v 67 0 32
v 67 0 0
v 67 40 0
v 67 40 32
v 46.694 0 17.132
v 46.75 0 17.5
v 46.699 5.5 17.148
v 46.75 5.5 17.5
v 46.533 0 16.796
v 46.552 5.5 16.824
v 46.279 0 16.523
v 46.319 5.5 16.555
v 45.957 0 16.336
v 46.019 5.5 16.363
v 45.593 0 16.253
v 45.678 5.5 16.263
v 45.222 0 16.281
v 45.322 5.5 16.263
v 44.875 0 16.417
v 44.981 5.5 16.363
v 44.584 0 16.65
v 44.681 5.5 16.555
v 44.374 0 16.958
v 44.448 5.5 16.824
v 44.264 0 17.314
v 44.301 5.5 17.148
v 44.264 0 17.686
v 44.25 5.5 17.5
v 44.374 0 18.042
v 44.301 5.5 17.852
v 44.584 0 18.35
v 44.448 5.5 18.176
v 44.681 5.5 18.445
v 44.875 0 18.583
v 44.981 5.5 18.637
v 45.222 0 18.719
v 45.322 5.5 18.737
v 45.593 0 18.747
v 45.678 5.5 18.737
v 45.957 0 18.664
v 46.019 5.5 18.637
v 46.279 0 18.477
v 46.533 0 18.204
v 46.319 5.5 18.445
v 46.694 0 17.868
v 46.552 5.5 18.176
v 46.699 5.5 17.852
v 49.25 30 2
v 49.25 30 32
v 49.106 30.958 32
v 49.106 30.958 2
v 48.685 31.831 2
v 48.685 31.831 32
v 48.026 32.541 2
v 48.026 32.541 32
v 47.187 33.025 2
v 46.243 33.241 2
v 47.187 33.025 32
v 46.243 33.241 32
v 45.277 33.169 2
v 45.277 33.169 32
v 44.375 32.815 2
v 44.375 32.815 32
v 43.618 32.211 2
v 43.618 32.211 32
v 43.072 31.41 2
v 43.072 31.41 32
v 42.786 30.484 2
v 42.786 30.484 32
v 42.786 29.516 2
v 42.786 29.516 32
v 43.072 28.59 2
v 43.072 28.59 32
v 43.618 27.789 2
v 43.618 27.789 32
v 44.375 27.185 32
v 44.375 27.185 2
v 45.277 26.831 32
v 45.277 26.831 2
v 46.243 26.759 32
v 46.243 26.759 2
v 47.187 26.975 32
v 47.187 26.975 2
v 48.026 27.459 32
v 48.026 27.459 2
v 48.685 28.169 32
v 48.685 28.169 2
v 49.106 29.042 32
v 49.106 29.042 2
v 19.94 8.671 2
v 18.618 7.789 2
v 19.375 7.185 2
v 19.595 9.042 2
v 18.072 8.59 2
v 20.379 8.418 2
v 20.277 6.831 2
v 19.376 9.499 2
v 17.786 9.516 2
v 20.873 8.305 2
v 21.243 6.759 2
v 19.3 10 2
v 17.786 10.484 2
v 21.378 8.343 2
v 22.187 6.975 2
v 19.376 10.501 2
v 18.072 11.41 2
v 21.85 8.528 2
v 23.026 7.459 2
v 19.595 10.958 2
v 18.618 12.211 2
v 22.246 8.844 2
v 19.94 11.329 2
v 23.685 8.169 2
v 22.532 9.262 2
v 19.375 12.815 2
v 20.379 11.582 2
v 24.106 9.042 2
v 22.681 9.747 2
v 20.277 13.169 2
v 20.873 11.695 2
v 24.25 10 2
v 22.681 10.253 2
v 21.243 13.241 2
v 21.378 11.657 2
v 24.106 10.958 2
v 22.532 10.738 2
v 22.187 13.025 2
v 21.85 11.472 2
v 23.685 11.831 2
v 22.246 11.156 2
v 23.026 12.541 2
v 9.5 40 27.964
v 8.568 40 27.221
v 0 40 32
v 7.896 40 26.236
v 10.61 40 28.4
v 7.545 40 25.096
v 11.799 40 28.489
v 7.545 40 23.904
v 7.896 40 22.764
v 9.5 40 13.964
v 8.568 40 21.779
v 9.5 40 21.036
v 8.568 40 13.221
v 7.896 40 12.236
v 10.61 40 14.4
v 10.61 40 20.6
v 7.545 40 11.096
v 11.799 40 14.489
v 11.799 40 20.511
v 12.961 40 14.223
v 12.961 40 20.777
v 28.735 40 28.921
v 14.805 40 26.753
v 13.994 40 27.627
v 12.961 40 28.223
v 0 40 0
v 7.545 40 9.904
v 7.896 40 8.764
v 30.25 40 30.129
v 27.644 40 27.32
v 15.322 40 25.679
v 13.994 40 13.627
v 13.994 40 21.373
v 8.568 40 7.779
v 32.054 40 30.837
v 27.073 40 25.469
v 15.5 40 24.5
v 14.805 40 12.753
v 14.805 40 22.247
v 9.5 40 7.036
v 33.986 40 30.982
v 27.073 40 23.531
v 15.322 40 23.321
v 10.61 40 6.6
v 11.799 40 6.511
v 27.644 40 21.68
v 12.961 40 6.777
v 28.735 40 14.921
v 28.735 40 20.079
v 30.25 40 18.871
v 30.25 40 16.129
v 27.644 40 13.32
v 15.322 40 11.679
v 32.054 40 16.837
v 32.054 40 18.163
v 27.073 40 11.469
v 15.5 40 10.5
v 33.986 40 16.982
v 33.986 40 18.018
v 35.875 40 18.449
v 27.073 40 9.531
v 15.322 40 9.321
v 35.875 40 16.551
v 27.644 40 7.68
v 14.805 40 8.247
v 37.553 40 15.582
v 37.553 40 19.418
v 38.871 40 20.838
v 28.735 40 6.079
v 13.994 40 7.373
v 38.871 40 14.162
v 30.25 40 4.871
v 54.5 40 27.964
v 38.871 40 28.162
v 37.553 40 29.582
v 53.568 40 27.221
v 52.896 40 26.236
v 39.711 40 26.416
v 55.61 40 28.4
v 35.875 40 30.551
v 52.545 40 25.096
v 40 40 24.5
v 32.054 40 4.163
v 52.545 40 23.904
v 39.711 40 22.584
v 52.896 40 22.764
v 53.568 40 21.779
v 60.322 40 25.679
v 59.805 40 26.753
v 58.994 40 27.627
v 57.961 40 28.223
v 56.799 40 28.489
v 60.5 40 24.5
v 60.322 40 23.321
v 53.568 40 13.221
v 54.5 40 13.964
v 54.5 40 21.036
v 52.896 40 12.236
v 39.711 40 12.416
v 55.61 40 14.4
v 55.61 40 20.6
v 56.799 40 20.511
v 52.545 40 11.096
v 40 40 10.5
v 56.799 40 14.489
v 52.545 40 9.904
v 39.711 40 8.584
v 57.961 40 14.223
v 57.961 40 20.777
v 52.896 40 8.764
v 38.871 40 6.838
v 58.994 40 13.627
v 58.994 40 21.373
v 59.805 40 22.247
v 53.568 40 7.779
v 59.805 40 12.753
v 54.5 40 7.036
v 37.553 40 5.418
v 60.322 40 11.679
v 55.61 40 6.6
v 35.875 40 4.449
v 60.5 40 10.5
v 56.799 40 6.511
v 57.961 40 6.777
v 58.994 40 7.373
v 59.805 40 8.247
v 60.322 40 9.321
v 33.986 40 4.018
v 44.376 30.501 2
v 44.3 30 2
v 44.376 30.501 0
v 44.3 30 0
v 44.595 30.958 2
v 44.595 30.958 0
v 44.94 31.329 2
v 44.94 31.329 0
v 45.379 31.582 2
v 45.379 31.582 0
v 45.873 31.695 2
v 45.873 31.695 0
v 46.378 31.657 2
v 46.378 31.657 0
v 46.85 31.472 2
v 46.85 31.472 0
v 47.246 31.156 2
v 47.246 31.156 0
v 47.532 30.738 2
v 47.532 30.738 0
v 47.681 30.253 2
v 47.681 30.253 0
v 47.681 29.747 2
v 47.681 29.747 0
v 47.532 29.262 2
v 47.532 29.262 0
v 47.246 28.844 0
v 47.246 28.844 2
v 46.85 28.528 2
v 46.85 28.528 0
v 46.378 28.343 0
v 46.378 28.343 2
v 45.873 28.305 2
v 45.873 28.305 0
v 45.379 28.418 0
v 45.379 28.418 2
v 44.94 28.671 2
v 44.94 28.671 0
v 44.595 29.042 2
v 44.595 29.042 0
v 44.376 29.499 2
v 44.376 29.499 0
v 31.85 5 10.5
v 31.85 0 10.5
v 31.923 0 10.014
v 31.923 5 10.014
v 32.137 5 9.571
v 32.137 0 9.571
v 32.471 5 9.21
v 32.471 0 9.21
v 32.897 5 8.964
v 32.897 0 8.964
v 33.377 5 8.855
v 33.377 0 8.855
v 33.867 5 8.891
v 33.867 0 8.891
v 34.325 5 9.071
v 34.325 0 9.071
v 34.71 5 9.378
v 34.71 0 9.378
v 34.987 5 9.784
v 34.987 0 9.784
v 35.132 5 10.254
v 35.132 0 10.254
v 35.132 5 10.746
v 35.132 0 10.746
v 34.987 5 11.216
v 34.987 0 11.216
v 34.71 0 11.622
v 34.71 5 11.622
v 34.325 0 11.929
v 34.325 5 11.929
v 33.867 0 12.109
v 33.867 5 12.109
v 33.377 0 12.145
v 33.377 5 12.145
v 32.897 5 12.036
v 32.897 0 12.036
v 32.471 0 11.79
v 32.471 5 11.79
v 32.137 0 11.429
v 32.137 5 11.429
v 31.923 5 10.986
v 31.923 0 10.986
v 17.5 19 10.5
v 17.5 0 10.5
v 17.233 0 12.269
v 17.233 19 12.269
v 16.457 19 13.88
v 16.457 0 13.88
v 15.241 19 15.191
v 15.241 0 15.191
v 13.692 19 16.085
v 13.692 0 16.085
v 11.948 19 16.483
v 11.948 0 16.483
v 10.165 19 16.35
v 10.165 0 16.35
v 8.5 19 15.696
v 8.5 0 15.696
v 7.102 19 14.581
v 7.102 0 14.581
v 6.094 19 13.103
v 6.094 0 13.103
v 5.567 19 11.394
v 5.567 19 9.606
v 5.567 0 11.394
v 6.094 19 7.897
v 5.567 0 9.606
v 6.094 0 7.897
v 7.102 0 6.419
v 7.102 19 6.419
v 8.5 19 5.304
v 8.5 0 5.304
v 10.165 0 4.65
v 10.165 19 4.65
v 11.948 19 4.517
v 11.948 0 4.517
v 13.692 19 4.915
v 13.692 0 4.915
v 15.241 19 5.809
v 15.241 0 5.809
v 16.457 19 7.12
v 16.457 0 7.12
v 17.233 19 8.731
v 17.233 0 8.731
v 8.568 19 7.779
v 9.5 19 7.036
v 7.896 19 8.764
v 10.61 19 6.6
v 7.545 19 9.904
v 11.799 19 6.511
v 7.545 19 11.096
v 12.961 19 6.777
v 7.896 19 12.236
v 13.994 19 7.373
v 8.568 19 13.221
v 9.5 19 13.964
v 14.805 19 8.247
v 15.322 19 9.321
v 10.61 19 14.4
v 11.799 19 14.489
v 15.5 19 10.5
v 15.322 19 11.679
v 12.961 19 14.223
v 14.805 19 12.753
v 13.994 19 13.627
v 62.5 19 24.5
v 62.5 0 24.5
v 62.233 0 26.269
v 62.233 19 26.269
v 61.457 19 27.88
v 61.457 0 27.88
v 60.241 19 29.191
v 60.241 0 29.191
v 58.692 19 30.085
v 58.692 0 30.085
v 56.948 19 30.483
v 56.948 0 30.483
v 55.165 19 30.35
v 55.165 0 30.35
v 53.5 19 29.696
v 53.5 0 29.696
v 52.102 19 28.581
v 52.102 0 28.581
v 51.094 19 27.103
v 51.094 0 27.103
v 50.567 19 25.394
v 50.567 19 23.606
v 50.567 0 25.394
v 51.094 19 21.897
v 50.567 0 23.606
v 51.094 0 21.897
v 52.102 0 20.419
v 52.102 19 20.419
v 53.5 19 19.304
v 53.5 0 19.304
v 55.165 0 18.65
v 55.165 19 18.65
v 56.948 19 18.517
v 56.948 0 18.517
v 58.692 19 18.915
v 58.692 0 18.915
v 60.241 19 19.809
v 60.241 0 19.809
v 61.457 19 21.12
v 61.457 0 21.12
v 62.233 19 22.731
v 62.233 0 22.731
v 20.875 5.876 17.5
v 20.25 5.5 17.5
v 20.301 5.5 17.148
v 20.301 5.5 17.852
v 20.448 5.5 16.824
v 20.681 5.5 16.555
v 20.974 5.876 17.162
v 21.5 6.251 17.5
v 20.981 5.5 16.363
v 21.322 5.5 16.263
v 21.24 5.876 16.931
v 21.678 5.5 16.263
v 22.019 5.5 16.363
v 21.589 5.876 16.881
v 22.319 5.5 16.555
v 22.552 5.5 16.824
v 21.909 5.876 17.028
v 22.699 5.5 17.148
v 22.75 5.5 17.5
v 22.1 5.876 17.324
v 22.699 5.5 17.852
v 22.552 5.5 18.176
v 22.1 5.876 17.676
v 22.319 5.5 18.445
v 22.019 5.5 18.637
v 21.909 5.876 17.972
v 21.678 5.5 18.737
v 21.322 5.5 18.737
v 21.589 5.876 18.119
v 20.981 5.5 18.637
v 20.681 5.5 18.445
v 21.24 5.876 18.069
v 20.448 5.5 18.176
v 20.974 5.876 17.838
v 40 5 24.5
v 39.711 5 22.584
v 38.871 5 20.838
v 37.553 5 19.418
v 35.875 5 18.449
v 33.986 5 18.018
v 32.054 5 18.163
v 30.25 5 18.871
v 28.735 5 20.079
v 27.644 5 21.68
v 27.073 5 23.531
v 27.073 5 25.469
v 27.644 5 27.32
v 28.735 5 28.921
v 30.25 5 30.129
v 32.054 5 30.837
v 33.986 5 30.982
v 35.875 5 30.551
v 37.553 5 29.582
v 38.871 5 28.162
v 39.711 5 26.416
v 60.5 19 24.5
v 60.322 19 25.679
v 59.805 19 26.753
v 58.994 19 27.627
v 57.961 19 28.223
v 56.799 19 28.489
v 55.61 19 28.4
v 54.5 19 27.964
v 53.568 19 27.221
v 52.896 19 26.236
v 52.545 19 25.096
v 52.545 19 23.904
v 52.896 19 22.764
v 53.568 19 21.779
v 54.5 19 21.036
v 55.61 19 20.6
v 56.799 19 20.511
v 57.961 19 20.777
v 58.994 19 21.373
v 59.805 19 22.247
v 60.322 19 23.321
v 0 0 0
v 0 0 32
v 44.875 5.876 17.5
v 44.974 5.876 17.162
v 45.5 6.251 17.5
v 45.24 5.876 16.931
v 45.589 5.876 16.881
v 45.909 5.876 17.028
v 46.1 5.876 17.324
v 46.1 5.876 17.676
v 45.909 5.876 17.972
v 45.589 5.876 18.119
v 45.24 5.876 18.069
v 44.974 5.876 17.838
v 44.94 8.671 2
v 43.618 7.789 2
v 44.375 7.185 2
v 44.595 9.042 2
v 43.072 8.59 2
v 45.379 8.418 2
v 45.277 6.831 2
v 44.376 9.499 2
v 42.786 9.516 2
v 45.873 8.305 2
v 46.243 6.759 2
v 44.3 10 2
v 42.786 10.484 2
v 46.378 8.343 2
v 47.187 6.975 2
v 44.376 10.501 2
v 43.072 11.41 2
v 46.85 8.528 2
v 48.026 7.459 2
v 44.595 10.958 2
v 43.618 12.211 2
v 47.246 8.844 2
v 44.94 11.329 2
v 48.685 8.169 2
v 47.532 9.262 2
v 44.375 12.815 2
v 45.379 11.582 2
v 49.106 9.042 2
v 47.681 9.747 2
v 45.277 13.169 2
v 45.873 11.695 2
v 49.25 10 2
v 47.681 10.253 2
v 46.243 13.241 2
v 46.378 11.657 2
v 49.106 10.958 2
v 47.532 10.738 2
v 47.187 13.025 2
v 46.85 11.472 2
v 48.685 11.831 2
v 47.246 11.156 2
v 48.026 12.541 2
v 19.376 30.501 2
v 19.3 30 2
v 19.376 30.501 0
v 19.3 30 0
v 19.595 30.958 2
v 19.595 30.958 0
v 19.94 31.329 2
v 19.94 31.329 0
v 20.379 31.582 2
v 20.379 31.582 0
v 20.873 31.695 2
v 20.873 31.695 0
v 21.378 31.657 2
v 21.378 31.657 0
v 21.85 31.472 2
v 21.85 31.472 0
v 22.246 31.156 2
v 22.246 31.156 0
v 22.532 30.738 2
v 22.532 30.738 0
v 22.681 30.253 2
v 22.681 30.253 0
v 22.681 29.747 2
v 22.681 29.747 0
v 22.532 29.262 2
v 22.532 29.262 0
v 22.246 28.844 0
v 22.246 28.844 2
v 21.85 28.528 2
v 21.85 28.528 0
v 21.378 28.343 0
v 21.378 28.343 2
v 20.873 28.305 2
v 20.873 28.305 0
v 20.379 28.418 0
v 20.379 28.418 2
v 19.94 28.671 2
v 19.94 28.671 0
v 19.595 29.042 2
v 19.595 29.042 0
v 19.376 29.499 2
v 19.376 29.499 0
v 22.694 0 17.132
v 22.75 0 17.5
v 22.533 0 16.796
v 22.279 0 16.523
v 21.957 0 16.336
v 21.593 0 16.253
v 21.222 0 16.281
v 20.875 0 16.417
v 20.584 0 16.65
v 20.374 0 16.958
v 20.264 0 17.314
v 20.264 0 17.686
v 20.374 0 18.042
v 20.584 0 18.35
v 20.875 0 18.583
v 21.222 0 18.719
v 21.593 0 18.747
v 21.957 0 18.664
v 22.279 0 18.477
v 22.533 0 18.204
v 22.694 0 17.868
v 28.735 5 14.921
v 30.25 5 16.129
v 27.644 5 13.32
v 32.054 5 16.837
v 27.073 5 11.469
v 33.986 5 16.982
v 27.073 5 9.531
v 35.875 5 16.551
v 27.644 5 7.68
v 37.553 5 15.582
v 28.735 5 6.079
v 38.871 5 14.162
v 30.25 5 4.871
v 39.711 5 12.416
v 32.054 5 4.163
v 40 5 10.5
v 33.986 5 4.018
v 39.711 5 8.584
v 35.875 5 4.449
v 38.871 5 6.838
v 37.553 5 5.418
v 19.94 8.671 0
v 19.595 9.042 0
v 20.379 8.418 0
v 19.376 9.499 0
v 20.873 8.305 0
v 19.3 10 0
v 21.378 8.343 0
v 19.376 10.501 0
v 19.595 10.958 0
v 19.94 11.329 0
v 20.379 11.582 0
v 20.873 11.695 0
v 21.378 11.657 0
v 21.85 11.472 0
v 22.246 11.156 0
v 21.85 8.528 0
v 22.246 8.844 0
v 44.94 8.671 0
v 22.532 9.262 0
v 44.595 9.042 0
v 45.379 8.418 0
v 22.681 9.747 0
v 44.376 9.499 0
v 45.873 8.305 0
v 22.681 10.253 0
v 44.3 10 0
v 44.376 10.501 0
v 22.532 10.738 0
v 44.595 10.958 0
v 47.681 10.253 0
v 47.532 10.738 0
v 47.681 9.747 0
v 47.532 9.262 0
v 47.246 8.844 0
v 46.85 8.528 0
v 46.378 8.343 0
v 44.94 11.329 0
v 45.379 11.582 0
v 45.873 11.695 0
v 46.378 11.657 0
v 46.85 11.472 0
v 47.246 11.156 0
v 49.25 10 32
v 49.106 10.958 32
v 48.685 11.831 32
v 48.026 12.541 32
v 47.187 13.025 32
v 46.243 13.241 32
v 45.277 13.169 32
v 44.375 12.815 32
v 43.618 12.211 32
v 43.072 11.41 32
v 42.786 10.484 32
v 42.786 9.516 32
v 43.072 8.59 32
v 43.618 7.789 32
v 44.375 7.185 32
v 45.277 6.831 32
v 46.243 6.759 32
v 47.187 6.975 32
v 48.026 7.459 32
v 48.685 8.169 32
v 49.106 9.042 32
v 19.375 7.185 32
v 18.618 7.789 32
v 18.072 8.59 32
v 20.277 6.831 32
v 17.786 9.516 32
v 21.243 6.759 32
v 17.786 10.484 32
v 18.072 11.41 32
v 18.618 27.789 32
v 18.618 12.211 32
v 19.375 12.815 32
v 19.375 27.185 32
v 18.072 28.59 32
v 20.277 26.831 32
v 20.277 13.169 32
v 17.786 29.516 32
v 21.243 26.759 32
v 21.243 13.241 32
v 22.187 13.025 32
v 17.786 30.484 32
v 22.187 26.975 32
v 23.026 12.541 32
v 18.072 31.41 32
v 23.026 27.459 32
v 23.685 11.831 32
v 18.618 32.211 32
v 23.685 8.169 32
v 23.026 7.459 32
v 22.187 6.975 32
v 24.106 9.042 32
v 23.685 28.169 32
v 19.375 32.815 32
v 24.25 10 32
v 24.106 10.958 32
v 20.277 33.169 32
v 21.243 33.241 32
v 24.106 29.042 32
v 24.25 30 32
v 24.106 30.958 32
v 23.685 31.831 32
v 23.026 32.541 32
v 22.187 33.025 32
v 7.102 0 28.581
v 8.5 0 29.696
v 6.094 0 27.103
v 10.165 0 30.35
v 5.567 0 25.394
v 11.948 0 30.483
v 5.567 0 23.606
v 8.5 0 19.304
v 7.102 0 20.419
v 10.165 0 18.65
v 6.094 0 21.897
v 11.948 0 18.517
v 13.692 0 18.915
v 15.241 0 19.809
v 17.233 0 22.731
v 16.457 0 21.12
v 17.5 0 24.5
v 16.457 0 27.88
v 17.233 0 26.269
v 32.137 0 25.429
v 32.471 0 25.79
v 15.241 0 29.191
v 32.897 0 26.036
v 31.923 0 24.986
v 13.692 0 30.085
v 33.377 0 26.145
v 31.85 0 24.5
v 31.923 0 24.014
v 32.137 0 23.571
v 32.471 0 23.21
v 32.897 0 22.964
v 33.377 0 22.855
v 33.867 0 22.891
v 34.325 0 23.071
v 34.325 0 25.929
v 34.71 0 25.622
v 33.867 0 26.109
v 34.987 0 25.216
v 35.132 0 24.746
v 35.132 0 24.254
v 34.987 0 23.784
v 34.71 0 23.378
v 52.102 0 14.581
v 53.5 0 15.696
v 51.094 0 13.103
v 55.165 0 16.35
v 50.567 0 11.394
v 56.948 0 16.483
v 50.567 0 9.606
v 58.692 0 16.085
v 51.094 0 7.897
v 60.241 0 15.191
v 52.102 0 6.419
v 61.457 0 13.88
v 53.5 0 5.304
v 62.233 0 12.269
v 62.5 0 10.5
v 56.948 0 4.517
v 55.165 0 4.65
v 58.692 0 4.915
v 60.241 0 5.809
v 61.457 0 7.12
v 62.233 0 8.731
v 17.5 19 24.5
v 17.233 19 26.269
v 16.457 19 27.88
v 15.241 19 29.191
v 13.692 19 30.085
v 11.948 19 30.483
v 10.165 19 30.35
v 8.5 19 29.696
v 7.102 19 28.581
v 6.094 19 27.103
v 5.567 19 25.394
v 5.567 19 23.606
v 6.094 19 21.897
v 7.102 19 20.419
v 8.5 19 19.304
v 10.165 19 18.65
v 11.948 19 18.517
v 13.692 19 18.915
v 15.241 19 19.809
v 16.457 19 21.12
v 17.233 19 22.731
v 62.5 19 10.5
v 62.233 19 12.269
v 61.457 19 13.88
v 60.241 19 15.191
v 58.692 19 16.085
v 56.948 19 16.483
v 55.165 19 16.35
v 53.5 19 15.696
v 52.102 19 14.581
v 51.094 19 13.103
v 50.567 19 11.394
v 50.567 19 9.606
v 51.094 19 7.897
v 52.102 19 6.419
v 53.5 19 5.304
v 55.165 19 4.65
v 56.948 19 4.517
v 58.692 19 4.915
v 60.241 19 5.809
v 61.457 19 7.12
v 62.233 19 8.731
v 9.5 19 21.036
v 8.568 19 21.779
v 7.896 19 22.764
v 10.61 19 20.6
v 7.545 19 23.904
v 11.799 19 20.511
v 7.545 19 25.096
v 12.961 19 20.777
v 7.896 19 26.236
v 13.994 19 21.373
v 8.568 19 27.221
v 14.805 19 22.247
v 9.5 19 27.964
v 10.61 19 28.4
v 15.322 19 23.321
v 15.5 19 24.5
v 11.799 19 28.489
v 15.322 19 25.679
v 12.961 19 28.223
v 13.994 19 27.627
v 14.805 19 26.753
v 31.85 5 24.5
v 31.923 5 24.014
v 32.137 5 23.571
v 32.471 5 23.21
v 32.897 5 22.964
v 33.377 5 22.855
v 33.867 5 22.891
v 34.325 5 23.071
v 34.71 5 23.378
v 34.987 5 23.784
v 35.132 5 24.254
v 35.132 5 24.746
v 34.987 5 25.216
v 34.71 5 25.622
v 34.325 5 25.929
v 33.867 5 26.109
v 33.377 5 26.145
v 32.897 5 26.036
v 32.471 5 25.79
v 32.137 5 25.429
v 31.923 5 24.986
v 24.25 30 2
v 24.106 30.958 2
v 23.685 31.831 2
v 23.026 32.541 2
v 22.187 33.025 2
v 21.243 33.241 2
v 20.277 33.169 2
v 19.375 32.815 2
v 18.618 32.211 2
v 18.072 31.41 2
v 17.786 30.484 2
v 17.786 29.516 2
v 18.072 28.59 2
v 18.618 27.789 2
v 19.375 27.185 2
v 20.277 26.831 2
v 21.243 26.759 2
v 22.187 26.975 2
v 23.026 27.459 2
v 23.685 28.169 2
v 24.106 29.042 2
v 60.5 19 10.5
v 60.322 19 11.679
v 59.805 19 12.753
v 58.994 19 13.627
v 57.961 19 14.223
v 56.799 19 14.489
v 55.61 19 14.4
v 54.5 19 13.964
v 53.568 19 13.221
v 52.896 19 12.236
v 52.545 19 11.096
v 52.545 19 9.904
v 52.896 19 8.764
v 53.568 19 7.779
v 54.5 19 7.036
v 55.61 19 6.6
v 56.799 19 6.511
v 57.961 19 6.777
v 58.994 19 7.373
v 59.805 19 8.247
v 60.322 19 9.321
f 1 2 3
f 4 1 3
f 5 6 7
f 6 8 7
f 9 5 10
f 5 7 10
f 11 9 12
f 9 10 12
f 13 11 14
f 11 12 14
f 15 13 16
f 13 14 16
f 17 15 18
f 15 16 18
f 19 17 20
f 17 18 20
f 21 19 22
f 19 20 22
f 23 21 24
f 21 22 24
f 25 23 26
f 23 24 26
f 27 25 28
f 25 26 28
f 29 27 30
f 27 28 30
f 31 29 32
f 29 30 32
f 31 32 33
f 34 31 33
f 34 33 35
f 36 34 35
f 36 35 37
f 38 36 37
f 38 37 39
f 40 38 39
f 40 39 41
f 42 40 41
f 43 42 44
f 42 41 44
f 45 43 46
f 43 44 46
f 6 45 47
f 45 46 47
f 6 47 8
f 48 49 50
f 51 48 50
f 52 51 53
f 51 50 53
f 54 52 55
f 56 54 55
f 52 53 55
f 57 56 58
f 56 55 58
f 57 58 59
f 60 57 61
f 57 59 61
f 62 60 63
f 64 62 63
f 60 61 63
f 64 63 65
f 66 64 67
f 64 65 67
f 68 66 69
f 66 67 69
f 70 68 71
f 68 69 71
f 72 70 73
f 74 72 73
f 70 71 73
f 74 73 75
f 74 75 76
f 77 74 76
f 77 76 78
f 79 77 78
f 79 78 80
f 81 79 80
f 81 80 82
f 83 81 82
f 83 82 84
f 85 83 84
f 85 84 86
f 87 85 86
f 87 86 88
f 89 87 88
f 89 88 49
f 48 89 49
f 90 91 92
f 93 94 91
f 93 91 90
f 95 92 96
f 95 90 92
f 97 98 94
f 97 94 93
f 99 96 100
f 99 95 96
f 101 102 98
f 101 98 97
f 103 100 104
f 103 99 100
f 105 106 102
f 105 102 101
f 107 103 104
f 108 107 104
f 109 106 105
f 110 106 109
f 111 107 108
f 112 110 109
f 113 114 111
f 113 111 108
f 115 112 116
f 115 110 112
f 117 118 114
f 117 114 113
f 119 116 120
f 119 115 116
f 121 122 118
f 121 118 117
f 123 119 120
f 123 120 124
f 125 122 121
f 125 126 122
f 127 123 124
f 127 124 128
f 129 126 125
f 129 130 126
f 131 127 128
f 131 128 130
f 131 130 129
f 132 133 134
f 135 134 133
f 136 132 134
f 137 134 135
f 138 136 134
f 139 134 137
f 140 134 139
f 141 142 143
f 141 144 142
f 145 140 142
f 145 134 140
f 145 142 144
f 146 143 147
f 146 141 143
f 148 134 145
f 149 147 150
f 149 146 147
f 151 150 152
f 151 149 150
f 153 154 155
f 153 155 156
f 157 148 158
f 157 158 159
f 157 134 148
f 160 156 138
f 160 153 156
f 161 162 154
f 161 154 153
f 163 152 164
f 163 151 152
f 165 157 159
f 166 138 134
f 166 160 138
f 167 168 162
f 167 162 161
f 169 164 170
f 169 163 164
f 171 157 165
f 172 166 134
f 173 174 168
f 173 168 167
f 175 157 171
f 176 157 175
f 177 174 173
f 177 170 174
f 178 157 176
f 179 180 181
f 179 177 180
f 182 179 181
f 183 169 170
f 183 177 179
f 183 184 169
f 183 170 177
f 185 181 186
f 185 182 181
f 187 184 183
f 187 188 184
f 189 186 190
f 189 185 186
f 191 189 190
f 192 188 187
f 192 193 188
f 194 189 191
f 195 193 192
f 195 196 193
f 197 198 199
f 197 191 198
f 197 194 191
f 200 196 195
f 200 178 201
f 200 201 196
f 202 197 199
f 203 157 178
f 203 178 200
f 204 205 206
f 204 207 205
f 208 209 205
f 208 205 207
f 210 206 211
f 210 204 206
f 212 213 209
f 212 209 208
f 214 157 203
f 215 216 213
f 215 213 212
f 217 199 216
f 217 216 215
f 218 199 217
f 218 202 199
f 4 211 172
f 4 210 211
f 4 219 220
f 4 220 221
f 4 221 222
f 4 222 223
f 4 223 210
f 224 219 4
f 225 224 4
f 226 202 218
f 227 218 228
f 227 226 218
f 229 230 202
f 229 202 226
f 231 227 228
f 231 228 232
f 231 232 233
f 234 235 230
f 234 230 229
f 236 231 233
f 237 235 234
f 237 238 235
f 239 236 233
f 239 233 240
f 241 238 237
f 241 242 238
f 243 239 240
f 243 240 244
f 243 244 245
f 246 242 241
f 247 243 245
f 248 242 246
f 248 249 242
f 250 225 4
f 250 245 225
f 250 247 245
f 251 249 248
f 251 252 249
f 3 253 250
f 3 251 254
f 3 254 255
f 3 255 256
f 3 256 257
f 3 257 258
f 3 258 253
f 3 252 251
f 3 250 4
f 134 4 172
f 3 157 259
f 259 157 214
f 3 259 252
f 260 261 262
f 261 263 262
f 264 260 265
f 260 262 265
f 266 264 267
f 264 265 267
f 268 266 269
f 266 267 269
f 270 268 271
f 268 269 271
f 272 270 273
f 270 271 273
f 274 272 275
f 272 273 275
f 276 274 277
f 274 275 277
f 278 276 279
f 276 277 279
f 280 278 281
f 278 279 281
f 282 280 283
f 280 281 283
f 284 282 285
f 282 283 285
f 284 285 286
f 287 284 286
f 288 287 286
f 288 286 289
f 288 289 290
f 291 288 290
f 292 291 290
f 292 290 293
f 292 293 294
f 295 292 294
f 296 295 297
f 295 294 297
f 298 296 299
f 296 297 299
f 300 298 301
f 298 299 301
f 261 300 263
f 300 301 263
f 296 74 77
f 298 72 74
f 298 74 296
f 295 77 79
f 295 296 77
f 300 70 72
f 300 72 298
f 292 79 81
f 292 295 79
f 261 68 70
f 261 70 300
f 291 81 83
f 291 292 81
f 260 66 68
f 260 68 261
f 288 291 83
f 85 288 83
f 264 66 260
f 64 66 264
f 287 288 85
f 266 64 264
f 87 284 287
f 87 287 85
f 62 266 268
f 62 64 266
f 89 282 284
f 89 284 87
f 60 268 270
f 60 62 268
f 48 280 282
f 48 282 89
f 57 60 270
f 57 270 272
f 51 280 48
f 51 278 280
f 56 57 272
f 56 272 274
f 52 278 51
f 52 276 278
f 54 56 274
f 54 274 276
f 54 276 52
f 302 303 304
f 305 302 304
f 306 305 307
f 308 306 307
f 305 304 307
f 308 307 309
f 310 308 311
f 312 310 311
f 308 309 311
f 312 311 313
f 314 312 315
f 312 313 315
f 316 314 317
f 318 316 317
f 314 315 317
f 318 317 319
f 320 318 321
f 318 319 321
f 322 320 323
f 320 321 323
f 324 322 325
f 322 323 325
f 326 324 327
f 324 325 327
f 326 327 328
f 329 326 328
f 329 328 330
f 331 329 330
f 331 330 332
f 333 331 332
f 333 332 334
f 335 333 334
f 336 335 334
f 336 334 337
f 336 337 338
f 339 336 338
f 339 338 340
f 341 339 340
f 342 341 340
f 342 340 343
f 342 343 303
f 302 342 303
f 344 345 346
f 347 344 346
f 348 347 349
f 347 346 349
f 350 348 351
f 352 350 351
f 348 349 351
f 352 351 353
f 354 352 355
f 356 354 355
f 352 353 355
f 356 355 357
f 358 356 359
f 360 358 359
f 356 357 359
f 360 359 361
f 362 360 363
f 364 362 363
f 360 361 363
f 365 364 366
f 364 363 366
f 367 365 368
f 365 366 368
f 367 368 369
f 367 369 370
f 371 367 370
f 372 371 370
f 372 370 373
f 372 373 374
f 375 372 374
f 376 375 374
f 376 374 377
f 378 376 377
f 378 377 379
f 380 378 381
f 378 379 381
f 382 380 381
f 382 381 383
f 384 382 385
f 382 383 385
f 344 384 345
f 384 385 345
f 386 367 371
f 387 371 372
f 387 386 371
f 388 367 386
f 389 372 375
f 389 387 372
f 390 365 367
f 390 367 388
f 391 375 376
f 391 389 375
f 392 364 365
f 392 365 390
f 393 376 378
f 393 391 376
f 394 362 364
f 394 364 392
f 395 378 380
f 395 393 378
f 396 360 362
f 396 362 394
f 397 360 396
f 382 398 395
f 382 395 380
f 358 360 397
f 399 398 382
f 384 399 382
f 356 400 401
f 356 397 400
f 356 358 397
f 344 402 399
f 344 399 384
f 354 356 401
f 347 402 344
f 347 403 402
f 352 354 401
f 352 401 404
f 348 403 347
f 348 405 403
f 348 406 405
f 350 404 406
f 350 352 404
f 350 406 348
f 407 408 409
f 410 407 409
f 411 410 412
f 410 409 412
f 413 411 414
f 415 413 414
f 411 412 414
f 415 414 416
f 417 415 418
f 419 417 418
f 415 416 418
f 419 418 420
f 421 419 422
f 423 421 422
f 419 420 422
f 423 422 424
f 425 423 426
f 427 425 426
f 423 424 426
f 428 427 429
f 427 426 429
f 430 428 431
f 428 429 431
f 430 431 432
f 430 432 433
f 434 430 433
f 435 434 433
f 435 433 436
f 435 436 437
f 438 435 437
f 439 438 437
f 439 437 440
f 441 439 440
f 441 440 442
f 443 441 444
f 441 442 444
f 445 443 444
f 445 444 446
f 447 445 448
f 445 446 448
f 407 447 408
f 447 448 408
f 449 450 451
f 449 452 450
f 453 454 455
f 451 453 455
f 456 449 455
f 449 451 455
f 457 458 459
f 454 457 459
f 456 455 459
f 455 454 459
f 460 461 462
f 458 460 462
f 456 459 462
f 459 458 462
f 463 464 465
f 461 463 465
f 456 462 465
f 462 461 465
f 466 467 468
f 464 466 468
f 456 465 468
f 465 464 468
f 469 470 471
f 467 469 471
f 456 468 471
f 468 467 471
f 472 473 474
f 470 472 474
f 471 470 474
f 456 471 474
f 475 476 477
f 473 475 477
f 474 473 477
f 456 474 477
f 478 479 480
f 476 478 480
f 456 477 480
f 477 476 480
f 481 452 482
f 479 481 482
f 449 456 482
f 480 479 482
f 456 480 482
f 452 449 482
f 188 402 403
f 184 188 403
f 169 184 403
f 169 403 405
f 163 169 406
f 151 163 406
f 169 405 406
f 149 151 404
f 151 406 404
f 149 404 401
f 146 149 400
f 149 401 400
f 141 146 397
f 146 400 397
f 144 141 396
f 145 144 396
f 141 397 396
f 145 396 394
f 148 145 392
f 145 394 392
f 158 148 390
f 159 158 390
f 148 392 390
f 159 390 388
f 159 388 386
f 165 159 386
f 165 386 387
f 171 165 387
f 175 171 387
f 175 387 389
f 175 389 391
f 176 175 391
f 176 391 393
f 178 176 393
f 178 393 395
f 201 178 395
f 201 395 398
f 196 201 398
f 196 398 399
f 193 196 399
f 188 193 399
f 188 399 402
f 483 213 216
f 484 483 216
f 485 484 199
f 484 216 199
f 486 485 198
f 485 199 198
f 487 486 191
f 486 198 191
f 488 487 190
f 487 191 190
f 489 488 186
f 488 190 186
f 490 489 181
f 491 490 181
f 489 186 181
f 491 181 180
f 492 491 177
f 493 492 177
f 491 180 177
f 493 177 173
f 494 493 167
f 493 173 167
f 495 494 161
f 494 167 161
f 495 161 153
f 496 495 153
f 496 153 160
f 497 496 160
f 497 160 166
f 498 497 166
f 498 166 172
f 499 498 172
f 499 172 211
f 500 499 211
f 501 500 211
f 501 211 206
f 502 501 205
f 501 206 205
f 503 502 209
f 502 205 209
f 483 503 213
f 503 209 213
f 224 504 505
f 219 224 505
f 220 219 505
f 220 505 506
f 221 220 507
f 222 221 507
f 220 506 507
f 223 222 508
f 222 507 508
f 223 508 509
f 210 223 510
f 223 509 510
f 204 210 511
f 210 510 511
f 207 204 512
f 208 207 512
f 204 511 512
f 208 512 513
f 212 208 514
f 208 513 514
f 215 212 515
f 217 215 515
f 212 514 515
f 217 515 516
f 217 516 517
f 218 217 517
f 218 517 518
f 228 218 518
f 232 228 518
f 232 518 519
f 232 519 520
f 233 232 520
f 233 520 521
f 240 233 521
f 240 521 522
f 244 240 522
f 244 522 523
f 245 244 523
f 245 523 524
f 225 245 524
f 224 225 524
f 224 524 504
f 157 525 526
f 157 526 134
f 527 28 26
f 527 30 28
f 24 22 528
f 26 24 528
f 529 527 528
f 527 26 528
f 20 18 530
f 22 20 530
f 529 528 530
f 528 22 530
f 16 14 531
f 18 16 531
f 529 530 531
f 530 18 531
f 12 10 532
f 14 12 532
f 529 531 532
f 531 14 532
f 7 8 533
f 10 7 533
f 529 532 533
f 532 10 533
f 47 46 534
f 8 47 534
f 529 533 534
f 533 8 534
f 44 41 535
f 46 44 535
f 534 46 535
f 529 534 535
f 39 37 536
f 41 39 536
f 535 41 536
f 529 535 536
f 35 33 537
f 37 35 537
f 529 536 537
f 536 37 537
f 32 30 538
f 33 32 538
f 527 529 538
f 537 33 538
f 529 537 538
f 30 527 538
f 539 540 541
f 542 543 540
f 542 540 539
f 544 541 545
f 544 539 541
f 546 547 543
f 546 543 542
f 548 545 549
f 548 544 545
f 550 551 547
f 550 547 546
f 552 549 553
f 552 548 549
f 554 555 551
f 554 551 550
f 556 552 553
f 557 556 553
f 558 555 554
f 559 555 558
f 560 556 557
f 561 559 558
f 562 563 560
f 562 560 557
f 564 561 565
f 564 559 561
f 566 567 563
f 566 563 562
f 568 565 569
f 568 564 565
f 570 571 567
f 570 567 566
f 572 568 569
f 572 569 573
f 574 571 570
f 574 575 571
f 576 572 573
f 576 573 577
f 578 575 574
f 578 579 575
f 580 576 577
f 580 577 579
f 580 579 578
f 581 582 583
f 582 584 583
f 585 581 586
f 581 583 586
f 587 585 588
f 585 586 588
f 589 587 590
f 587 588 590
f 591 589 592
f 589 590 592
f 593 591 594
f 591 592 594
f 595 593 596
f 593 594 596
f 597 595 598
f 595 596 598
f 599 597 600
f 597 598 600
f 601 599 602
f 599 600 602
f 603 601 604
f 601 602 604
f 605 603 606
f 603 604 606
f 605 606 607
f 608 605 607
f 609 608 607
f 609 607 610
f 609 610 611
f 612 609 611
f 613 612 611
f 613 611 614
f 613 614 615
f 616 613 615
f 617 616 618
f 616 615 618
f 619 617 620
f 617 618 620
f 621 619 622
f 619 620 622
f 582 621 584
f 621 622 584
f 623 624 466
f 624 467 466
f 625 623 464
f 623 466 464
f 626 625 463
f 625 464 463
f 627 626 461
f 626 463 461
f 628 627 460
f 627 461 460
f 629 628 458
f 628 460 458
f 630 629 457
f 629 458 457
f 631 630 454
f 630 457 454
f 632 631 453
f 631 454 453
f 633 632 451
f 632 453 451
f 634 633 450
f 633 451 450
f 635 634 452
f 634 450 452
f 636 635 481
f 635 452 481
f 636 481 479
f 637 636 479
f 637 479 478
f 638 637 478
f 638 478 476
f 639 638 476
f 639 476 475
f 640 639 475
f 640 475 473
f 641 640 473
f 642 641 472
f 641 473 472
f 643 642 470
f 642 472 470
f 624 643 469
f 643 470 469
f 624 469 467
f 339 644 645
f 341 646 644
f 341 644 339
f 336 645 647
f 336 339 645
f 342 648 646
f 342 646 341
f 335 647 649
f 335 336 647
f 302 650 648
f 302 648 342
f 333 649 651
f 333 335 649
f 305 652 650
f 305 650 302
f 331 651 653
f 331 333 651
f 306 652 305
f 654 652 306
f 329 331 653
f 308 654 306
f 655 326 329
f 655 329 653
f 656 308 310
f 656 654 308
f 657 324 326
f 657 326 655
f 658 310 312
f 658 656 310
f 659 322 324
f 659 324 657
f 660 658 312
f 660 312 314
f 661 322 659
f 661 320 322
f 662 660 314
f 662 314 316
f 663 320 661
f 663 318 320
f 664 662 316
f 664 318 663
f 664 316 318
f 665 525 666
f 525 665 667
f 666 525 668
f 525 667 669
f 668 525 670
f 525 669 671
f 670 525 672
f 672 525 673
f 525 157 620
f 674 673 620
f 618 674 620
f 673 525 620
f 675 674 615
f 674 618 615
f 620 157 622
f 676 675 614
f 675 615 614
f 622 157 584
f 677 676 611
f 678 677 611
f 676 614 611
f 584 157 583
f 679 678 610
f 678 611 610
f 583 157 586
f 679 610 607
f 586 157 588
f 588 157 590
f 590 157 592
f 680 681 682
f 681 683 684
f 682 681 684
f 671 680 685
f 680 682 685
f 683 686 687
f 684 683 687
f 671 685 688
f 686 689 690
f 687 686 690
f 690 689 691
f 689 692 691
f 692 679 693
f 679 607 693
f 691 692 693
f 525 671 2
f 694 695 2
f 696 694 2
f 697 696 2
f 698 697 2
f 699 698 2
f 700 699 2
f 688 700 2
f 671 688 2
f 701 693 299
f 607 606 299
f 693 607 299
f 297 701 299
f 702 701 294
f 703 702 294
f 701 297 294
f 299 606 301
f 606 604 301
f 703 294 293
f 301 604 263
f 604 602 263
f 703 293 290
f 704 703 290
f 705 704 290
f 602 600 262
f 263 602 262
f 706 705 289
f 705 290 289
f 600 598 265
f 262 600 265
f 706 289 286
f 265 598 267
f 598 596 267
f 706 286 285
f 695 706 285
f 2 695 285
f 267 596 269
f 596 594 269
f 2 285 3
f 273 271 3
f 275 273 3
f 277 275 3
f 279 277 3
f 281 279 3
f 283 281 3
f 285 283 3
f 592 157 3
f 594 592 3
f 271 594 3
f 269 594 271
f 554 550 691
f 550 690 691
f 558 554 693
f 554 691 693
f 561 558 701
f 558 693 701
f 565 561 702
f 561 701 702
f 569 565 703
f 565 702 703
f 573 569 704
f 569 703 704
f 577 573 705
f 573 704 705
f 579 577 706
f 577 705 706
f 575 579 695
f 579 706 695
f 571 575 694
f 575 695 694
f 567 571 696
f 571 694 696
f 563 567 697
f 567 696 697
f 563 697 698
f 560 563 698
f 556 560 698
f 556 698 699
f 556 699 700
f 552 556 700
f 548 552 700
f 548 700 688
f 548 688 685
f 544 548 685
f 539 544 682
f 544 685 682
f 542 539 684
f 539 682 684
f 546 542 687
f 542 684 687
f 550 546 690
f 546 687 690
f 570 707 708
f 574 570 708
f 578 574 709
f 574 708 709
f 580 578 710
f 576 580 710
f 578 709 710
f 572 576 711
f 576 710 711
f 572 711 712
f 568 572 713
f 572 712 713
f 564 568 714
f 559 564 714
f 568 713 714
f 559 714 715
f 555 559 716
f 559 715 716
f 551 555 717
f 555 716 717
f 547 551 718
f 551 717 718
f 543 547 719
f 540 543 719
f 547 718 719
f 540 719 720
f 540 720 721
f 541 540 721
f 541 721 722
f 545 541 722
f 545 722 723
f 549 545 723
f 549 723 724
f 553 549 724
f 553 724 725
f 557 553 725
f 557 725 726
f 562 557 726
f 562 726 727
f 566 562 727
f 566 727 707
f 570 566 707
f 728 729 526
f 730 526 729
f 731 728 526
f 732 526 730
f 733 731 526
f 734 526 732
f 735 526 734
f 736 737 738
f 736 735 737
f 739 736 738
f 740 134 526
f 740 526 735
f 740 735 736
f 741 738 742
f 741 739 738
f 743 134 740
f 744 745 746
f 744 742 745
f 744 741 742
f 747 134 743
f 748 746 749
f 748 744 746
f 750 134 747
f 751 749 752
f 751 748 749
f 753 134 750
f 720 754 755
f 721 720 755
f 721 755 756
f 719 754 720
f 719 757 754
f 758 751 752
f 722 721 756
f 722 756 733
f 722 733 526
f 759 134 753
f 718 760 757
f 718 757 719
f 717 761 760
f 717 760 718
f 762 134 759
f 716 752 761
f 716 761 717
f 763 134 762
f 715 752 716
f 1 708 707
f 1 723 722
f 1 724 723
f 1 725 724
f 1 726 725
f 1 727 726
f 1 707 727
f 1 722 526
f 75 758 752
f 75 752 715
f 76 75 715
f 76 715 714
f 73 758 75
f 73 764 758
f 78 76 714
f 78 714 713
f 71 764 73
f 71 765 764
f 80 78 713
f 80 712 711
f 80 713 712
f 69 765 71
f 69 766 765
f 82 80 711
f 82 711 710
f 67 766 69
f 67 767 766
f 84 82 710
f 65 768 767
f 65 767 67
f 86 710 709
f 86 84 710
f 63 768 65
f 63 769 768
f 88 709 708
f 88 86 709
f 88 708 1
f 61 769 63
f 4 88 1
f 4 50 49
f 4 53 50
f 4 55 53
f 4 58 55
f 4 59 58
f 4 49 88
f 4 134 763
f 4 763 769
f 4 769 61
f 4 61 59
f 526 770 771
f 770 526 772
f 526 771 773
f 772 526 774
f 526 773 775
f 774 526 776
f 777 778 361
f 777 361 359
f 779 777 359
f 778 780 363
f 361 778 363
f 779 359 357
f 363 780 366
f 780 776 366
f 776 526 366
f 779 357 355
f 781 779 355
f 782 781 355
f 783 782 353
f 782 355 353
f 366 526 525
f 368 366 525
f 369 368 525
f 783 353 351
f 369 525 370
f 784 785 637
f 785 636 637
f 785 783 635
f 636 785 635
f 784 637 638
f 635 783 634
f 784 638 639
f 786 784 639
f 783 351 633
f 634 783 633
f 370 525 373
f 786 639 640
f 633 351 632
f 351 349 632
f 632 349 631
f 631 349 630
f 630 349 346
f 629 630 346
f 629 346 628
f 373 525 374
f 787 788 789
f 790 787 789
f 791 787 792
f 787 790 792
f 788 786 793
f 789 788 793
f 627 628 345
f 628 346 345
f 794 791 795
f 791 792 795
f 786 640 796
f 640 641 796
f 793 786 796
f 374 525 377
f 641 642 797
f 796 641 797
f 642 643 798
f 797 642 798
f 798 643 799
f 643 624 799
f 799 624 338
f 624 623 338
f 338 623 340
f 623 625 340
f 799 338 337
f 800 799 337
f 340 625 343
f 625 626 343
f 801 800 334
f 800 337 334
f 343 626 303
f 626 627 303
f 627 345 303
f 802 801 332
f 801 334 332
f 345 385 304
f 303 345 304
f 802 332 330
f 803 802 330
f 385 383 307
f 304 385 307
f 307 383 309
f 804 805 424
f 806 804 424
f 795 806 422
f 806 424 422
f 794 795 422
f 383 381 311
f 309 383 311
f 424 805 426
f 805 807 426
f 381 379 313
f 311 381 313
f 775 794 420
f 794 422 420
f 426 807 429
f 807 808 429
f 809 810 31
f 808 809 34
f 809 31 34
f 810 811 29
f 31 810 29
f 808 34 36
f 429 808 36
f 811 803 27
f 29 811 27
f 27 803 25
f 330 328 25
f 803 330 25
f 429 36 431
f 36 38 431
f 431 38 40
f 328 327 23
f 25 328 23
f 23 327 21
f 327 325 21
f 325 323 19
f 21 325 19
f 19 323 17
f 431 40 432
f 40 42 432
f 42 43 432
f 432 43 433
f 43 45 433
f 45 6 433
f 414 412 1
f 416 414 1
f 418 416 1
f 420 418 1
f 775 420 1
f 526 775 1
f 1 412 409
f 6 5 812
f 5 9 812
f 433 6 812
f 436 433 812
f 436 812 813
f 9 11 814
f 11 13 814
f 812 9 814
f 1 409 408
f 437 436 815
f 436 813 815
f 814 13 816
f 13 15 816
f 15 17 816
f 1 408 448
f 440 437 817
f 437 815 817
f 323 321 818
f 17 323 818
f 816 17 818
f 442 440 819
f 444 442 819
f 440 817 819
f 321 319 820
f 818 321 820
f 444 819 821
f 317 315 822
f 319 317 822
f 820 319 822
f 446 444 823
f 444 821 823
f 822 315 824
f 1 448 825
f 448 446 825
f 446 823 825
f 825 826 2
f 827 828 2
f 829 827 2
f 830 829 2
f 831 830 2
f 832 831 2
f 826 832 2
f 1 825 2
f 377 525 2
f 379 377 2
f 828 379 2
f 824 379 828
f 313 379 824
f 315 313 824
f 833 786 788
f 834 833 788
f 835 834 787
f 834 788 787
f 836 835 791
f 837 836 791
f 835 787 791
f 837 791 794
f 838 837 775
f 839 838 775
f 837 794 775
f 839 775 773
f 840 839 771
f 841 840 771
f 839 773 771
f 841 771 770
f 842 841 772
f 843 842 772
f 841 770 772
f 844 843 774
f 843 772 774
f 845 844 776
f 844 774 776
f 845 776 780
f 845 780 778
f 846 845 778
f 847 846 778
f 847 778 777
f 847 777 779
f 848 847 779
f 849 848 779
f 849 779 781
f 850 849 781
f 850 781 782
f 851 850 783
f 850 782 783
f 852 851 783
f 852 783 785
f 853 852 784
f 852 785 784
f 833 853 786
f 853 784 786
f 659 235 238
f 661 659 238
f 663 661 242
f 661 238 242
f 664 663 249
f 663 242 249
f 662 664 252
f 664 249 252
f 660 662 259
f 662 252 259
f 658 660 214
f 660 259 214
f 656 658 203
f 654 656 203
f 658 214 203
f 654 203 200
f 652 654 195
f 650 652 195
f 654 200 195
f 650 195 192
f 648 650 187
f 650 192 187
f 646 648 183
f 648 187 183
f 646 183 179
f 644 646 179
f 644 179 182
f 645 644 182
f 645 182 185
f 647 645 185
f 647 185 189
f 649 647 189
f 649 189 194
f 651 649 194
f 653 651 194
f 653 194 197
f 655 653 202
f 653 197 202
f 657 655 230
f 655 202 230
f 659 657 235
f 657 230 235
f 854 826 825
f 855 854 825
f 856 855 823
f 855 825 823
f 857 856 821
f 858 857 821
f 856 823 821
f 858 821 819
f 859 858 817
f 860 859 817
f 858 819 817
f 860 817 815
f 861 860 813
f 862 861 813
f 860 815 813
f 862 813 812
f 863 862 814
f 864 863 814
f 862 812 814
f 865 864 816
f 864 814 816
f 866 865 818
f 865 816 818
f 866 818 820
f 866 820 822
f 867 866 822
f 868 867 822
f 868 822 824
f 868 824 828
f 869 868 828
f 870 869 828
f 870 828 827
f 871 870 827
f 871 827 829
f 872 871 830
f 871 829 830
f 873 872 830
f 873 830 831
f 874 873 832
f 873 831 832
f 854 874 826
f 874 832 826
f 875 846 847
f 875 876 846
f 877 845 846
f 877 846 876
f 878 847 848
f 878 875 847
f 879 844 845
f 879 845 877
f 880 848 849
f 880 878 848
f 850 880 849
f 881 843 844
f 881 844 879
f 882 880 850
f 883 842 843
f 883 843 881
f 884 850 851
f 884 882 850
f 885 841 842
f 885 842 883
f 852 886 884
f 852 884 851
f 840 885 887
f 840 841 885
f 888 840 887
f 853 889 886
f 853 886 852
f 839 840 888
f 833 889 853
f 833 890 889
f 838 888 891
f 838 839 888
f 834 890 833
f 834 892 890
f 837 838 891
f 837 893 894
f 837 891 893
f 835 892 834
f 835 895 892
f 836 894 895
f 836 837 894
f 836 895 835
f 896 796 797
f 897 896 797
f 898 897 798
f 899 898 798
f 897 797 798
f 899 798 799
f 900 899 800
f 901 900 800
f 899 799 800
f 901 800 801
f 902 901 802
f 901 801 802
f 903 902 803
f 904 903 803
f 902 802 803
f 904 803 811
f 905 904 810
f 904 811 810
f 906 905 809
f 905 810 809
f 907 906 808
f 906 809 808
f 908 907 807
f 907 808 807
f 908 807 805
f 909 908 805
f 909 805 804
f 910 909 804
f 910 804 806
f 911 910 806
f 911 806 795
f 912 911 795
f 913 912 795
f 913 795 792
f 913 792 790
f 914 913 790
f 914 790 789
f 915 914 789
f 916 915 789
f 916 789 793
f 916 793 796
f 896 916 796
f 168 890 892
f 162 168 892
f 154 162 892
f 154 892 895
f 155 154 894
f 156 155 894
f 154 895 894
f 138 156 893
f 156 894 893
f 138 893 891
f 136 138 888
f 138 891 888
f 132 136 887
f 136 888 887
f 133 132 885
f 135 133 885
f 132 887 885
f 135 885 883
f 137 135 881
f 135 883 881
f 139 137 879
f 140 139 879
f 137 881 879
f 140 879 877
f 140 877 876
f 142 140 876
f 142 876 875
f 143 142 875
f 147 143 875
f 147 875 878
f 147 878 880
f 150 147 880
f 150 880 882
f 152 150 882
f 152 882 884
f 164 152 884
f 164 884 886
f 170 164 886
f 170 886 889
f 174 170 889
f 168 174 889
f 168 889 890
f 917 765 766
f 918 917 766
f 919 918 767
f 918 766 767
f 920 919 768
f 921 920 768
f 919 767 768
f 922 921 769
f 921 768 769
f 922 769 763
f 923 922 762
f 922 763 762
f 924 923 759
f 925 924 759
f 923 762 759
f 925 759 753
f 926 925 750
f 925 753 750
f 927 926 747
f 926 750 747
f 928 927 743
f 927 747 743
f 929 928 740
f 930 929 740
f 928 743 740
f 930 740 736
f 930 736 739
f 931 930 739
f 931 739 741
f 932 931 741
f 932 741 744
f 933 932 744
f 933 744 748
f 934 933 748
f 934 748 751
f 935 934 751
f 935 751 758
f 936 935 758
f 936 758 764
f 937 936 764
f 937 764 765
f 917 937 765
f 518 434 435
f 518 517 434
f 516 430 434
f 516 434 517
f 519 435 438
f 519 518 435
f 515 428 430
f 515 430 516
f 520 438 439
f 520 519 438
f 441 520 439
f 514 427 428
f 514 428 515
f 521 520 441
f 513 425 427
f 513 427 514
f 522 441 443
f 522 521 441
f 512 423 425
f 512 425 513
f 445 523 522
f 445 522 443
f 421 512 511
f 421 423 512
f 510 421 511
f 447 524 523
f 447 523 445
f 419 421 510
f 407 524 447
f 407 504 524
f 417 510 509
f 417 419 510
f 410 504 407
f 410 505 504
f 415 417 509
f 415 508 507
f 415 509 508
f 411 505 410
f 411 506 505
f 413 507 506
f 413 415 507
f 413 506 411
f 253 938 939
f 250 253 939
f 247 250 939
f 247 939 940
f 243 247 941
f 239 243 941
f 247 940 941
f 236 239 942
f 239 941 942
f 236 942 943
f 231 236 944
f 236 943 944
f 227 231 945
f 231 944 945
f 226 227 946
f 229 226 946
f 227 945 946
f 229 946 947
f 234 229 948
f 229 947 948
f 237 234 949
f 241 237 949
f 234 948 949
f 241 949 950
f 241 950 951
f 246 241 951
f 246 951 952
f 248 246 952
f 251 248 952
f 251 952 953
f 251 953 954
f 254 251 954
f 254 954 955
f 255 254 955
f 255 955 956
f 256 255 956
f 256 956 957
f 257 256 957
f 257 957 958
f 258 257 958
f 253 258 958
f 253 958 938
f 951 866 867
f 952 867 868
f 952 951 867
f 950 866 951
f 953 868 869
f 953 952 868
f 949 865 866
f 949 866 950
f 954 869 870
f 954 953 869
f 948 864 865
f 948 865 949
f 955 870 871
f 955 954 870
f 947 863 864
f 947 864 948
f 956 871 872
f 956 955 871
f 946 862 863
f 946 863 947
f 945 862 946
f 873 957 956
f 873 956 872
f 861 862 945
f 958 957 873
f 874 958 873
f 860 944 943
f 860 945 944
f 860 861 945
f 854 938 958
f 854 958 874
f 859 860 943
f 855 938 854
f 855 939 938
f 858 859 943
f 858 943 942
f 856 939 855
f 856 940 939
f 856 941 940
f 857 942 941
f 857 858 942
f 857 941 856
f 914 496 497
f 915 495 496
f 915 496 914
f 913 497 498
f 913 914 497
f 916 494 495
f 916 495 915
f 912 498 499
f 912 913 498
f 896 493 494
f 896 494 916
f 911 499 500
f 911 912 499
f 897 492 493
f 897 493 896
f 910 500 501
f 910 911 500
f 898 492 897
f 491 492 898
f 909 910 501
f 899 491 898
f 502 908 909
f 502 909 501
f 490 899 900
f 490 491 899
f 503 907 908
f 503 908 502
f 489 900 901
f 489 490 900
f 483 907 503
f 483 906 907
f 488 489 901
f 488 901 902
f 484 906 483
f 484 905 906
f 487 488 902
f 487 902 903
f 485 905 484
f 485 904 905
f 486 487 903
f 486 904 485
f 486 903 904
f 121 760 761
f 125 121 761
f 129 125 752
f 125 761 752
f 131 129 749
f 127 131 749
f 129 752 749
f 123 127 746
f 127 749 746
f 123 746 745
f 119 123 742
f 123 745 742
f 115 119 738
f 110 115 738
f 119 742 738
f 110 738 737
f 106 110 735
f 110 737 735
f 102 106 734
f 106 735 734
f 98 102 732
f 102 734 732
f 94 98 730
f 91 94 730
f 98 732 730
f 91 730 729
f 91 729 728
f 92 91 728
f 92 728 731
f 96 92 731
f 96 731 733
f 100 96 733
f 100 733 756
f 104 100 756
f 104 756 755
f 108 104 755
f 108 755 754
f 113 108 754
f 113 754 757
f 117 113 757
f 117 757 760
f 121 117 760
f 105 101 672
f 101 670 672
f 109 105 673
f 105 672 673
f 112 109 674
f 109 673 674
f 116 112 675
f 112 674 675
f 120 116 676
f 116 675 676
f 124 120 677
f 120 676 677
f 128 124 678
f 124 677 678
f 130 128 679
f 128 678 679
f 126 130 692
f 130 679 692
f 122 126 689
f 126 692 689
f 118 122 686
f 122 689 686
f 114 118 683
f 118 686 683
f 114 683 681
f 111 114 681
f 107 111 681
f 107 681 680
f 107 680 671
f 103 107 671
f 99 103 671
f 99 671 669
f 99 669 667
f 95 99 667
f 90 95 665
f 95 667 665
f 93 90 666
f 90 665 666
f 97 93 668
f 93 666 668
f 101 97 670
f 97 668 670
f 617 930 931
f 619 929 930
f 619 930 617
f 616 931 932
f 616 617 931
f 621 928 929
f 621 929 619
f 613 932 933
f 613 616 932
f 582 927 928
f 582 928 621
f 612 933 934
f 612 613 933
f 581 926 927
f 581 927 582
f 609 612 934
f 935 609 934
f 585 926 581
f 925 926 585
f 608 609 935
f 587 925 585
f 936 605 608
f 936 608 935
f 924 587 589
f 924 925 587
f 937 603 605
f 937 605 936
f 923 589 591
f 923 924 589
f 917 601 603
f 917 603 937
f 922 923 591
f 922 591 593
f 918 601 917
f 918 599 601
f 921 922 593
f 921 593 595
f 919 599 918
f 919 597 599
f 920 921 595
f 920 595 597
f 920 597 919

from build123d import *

# Parameters (mm, degrees)
SKETCH1_W                      = 67
SKETCH1_H                      = 40
BOSS_EXTRUDE1_DEPTH            = 32
SKETCH2_R                      = 6
CUT_EXTRUDE1_DEPTH             = 19
SKETCH4_R                      = 4
CUT_EXTRUDE2_DEPTH             = 22
LPATTERN1_COUNT                = 2
LPATTERN1_PITCH                = 45
LPATTERN1_COUNT_DIR2           = 2
LPATTERN1_PITCH_DIR2           = 14
SKETCH5_R                      = 6.5
CUT_EXTRUDE3_DEPTH             = 35
M4X0_7_TAPPED_HOLE1_D          = 3.3
CBORE_FOR_M3_SHCS1_D           = 3.4
CBORE_FOR_M3_SHCS1_CBORE_D     = 6.5
CBORE_FOR_M3_SHCS1_CBORE_DEPTH = 30
LPATTERN2_COUNT                = 2
LPATTERN2_PITCH                = 25
LPATTERN2_COUNT_DIR2           = 2
LPATTERN2_PITCH_DIR2           = 20
M3X0_5_TAPPED_HOLE1_D          = 2.5
M3X0_5_TAPPED_HOLE1_DEPTH      = 5.5
M3X0_5_TAPPED_HOLE1_TIP        = 0.751075774


with BuildPart() as part:
    # Sketch1 → Boss-Extrude1 (new body)
    with BuildSketch(Plane.XY):
        with Locations((33.5, 20)):
            Rectangle(SKETCH1_W, SKETCH1_H)
    extrude(amount=BOSS_EXTRUDE1_DEPTH)

    # Sketch2 → Cut-Extrude1 (cut)
    with BuildSketch(Plane.XZ):
        with Locations((11.5, 24.5)):
            Circle(SKETCH2_R)
    cut_extrude1 = extrude(amount=-CUT_EXTRUDE1_DEPTH, mode=Mode.SUBTRACT)

    # Sketch4 → Cut-Extrude2 (cut, through all)
    with BuildSketch(Plane.XZ.offset(-19)):
        with Locations((11.5, 24.5)):
            Circle(SKETCH4_R)
    cut_extrude2 = extrude(amount=-CUT_EXTRUDE2_DEPTH, mode=Mode.SUBTRACT)

    # LPattern1: Cut-Extrude1, Cut-Extrude2 2 × 2
    with Locations(*[(i * LPATTERN1_PITCH, 0, -j * LPATTERN1_PITCH_DIR2) for i in range(LPATTERN1_COUNT) for j in range(LPATTERN1_COUNT_DIR2) if (i, j) != (0, 0)]):
        add(cut_extrude1, mode=Mode.SUBTRACT)
        add(cut_extrude2, mode=Mode.SUBTRACT)

    # Sketch5 → Cut-Extrude3 (cut)
    with BuildSketch(Plane(origin=(0, 40, 0), x_dir=(1, 0, 0), z_dir=(0, 1, 0))):
        with Locations((33.5, -10.5)):
            Circle(SKETCH5_R)
        with Locations((33.5, -24.5)):
            Circle(SKETCH5_R)
    extrude(amount=-CUT_EXTRUDE3_DEPTH, mode=Mode.SUBTRACT)

    # M4x0.7 Tapped Hole1 (through all)
    with Locations(Plane(origin=(0, 5, 0), x_dir=(1, 0, 0), z_dir=(0, 1, 0))):
        with Locations((33.5, -24.5), (33.5, -10.5)):
            Hole(M4X0_7_TAPPED_HOLE1_D / 2)

    # CBORE for M3 SHCS1 (through all)
    with Locations(Plane.XY.offset(32)):
        with Locations((21, 30)):
            cbore_for_m3_shcs1 = CounterBoreHole(CBORE_FOR_M3_SHCS1_D / 2, CBORE_FOR_M3_SHCS1_CBORE_D / 2, CBORE_FOR_M3_SHCS1_CBORE_DEPTH)

    # LPattern2: CBORE for M3 SHCS1 2 × 2
    with Locations(*[(i * LPATTERN2_PITCH, -j * LPATTERN2_PITCH_DIR2, 0) for i in range(LPATTERN2_COUNT) for j in range(LPATTERN2_COUNT_DIR2) if (i, j) != (0, 0)]):
        add(cbore_for_m3_shcs1, mode=Mode.SUBTRACT)

    # M3x0.5 Tapped Hole1
    with Locations(Plane(origin=(0, 0, 0), x_dir=(-1, 0, 0), z_dir=(0, -1, 0))):
        with Locations((-45.5, -17.5), (-21.5, -17.5)):
            Hole(M3X0_5_TAPPED_HOLE1_D / 2, depth=M3X0_5_TAPPED_HOLE1_DEPTH)
            with Locations((0, 0, -(M3X0_5_TAPPED_HOLE1_DEPTH + M3X0_5_TAPPED_HOLE1_TIP / 2))):  # 118° drill point
                Cone(0, M3X0_5_TAPPED_HOLE1_D / 2, M3X0_5_TAPPED_HOLE1_TIP, mode=Mode.SUBTRACT)


solid = part.part
